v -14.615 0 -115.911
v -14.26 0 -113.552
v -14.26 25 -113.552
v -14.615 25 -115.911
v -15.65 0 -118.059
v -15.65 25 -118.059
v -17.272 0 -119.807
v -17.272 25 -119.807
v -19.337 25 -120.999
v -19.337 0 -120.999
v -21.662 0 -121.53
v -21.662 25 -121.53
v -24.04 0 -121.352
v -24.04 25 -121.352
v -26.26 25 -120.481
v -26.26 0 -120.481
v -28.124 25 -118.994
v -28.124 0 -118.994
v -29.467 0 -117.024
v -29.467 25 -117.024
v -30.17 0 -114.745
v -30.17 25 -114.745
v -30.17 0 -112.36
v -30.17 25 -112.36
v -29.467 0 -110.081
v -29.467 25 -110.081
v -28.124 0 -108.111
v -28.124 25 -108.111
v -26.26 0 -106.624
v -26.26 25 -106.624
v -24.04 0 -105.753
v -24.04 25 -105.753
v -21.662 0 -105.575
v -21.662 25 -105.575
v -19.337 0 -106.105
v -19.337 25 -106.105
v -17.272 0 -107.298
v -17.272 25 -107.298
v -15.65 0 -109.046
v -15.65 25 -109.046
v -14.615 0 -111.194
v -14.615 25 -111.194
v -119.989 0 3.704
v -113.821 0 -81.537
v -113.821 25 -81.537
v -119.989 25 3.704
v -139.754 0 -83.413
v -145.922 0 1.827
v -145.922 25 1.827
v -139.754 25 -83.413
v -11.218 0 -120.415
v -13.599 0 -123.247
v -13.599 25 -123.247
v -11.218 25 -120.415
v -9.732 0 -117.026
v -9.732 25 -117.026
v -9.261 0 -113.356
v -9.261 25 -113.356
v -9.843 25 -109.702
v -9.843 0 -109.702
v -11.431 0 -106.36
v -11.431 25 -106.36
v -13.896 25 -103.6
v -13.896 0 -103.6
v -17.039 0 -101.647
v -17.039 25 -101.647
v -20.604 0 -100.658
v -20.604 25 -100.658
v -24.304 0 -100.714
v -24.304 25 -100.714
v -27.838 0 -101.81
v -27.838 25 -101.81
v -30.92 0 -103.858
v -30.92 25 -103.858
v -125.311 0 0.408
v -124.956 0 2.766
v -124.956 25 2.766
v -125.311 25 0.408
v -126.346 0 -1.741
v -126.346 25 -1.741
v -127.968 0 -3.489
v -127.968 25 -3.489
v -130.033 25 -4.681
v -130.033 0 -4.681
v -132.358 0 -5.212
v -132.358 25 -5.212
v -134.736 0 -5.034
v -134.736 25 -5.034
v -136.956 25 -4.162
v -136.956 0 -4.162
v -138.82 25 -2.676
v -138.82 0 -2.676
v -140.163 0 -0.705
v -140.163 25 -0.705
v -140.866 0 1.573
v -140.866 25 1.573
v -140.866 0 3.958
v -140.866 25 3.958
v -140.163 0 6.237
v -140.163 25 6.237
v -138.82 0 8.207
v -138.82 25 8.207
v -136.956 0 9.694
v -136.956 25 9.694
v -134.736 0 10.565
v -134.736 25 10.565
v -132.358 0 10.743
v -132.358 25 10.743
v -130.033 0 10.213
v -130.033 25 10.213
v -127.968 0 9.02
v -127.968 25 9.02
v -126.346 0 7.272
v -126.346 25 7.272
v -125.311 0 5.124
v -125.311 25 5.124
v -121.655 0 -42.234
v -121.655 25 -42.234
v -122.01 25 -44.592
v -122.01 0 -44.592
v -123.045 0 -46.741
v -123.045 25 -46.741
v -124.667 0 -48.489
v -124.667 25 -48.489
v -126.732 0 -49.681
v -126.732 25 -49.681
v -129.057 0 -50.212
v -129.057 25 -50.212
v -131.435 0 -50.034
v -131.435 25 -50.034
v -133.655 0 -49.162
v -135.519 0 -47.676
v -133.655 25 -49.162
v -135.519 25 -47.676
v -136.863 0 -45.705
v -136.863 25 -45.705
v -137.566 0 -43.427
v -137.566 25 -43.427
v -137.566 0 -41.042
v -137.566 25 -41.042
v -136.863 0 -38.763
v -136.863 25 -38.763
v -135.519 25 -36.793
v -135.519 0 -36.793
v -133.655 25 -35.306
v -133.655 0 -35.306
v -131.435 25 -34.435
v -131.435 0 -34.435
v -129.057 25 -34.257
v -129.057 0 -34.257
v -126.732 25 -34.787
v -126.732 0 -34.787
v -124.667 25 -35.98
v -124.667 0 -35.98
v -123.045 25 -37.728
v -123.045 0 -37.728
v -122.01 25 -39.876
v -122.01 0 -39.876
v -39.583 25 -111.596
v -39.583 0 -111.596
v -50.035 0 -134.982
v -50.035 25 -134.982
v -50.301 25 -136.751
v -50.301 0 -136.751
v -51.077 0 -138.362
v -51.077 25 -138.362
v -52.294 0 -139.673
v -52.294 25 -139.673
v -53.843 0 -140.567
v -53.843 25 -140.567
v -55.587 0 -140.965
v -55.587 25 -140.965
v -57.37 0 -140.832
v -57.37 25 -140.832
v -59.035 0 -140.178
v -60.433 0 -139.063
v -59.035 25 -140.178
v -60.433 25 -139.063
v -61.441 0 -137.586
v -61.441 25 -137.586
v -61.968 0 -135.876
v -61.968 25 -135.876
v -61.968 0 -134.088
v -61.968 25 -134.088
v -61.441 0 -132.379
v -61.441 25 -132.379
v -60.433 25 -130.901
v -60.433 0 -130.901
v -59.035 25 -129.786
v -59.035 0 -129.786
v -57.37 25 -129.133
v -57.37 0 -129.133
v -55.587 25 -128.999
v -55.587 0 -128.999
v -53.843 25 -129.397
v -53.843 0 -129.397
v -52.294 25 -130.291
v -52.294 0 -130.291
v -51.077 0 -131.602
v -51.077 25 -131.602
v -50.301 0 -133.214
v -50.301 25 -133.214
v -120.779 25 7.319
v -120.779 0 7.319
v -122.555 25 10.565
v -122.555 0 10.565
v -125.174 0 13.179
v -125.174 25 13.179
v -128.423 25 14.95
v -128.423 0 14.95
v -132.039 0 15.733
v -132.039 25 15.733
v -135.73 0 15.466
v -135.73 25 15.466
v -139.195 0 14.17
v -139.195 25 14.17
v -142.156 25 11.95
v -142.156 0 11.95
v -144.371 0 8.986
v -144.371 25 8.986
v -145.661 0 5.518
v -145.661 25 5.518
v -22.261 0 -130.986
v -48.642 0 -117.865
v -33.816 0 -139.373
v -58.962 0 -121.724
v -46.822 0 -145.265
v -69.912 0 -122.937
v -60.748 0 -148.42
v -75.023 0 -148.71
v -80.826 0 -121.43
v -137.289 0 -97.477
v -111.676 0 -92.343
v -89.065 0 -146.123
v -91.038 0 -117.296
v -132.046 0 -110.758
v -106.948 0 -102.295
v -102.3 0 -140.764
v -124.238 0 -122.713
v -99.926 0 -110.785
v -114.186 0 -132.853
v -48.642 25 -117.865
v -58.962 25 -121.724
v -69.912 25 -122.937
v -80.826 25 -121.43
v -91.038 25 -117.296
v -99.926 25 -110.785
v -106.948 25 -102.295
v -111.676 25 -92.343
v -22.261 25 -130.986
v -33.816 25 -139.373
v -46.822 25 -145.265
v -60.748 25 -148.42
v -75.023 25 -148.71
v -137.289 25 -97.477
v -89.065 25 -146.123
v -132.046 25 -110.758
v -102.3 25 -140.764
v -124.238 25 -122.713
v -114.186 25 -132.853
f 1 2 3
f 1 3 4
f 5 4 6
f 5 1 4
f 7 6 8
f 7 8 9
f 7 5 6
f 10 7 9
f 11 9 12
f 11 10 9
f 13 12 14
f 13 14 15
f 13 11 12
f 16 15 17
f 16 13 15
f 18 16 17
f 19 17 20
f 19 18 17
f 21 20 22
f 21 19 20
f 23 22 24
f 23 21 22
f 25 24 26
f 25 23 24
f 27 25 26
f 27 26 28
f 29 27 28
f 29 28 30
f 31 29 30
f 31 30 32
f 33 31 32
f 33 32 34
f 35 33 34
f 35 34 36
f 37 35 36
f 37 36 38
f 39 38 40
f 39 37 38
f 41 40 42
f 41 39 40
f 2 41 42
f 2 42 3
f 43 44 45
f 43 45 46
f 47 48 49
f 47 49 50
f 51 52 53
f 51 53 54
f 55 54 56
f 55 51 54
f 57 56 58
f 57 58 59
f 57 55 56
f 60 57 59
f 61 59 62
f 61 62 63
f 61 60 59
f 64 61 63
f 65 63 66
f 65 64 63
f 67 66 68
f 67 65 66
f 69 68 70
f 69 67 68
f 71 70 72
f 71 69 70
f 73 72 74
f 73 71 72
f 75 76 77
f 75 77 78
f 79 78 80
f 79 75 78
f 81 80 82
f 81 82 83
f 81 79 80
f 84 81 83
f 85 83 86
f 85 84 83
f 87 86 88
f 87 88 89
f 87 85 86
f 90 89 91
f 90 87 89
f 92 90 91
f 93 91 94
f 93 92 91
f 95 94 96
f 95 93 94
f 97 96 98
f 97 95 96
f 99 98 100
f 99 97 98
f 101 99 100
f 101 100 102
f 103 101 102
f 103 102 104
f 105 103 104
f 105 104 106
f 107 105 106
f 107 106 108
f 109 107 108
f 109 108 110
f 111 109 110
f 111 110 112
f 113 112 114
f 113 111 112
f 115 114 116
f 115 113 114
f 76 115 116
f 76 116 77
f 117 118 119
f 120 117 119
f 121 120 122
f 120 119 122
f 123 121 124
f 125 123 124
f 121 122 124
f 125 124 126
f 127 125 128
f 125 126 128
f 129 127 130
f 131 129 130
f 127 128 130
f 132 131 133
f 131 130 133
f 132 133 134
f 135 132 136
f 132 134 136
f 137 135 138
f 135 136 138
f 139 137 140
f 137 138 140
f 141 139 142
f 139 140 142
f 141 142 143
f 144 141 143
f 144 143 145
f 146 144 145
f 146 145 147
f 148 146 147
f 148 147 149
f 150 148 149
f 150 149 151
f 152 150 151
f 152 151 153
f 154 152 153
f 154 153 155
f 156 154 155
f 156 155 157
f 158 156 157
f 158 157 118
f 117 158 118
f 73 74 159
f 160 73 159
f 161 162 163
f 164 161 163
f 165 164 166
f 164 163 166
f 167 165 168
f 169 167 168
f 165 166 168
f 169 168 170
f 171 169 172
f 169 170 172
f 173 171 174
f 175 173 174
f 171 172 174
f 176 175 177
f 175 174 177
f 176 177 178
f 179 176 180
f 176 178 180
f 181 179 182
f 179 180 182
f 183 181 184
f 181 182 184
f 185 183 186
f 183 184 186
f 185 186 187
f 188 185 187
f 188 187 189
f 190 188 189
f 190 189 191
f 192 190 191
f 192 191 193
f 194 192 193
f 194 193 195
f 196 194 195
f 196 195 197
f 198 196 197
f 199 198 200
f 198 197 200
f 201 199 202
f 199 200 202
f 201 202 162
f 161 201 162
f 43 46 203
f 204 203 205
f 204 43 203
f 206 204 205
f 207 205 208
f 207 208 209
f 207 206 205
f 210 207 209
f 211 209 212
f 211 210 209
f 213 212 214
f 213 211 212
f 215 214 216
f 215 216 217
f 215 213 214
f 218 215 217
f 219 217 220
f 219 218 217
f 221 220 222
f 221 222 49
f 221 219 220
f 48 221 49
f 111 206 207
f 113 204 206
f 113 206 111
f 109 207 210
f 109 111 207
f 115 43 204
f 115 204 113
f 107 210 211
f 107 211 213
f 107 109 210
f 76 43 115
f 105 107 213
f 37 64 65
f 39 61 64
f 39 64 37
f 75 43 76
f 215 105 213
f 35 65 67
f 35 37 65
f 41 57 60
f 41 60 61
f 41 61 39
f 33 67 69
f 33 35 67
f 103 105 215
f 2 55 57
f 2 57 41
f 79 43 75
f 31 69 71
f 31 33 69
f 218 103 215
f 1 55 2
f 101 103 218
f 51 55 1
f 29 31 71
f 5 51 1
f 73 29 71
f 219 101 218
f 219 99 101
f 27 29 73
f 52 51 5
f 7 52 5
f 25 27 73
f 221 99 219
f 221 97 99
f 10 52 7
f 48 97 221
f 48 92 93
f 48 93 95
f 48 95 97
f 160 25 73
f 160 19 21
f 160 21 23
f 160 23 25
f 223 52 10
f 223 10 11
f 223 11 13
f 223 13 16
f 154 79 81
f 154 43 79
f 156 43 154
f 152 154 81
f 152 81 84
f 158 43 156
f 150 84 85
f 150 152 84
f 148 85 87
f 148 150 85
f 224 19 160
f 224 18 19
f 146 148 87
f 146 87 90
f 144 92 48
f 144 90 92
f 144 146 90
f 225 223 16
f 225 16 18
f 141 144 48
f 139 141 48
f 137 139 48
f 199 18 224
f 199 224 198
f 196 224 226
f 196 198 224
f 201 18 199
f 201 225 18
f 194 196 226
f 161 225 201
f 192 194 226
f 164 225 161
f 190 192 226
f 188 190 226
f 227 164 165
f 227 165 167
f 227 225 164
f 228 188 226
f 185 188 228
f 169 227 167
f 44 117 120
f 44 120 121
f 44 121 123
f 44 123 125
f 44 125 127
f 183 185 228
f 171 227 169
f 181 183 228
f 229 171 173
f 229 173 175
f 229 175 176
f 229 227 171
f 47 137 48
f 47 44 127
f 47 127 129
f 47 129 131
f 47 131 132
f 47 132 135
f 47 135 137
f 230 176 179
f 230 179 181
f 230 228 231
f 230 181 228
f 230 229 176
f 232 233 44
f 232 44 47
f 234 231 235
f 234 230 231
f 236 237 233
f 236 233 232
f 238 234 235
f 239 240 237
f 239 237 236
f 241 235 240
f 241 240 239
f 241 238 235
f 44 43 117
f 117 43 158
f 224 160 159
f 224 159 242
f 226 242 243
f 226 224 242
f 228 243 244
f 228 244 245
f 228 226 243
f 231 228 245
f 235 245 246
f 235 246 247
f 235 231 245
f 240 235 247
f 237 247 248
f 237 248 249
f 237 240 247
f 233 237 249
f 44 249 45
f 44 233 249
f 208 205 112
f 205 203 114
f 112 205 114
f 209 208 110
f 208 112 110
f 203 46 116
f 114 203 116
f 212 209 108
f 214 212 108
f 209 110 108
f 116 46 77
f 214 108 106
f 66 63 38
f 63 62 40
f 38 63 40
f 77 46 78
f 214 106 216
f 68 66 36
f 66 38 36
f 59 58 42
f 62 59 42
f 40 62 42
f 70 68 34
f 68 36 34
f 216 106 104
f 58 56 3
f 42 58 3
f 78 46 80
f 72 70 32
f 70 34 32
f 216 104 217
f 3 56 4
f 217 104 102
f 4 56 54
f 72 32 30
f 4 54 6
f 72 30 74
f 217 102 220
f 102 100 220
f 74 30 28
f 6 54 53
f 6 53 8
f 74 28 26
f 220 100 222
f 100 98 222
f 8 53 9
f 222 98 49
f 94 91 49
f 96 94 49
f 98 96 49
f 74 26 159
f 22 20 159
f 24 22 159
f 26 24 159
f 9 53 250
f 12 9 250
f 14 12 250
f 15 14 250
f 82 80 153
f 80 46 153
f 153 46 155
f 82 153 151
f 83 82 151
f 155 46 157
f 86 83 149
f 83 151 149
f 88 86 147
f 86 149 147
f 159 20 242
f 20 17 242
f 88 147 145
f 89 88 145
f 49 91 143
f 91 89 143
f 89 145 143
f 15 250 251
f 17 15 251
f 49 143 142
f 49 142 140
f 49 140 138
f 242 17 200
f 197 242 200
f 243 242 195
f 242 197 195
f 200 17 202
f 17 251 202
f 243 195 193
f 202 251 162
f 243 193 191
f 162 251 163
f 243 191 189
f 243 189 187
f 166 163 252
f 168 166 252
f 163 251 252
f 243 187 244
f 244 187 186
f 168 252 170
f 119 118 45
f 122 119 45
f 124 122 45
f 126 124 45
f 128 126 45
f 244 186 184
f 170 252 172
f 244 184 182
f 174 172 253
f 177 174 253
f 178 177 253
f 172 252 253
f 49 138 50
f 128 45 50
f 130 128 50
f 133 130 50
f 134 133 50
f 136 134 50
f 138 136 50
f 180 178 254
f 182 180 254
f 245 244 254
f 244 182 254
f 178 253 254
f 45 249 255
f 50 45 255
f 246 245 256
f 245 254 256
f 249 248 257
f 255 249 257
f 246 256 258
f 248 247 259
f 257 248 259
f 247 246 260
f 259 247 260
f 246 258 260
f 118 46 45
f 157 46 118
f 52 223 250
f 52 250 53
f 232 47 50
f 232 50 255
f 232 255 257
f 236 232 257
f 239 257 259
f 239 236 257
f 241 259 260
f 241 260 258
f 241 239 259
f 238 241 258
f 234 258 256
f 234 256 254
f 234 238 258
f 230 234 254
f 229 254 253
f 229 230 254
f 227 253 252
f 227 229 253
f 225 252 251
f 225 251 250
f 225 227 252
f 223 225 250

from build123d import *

# Parameters (mm, degrees)
SZKIC1_R                    = 8
DODANIE_WYCI_GNI_CIE1_DEPTH = 25
SZKIC2_R                    = 6
WYTNIJ_WYCI_GNI_CIE1_DEPTH  = 25
SZKIC3_R                    = 8
WYTNIJ_WYCI_GNI_CIE2_DEPTH  = 2000


with BuildPart() as part:
    # Szkic1 → Dodanie-wyciągnięcie1 (new body)
    with BuildSketch(Plane(origin=(0, 0, 0), x_dir=(1, 0, 0), z_dir=(0, 1, 0))):
        with BuildLine():
            Line((-145.921678768, -1.827473833), (-139.75350446, 83.413416114))
            ThreePointArc((-139.75350446, 83.413416114), (-95.818169931, 143.778859358), (-22.261154385, 130.985664988))
            Line((-22.261154385, 130.985664988), (-13.598892288, 123.247376031))
            ThreePointArc((-13.598892288, 123.247376031), (-12.564771829, 104.891706747), (-30.920441114, 103.857586288))
            Line((-30.920441114, 103.857586288), (-39.58270321, 111.595875245))
            ThreePointArc((-39.58270321, 111.595875245), (-86.060369899, 119.679371012), (-113.821309069, 81.536918796))
            Line((-113.821309069, 81.536918796), (-119.989483377, -3.703971151))
            ThreePointArc((-119.989483377, -3.703971151), (-133.893829731, -15.731820187), (-145.921678768, -1.827473833))
        make_face()
        with Locations((-132.955581072, -2.765722492)):
            Circle(SZKIC1_R, mode=Mode.SUBTRACT)
        with Locations((-22.259666701, 113.552481159)):
            Circle(SZKIC1_R, mode=Mode.SUBTRACT)
    extrude(amount=DODANIE_WYCI_GNI_CIE1_DEPTH)

    # Szkic2 → Wytnij-wyciągnięcie1 (cut)
    with BuildSketch(Plane(origin=(0, 25, 0), x_dir=(1, 0, 0), z_dir=(0, 1, 0))):
        with Locations((-56.034895704, 134.982224644)):
            Circle(SZKIC2_R)
    extrude(amount=-WYTNIJ_WYCI_GNI_CIE1_DEPTH, mode=Mode.SUBTRACT)

    # Szkic3 → Wytnij-wyciągnięcie2 (cut)
    with BuildSketch(Plane(origin=(0, 25, 0), x_dir=(1, 0, 0), z_dir=(0, 1, 0))):
        with Locations((-129.654921114, 42.234277508)):
            Circle(SZKIC3_R)
    extrude(amount=-WYTNIJ_WYCI_GNI_CIE2_DEPTH, mode=Mode.SUBTRACT)


solid = part.part
